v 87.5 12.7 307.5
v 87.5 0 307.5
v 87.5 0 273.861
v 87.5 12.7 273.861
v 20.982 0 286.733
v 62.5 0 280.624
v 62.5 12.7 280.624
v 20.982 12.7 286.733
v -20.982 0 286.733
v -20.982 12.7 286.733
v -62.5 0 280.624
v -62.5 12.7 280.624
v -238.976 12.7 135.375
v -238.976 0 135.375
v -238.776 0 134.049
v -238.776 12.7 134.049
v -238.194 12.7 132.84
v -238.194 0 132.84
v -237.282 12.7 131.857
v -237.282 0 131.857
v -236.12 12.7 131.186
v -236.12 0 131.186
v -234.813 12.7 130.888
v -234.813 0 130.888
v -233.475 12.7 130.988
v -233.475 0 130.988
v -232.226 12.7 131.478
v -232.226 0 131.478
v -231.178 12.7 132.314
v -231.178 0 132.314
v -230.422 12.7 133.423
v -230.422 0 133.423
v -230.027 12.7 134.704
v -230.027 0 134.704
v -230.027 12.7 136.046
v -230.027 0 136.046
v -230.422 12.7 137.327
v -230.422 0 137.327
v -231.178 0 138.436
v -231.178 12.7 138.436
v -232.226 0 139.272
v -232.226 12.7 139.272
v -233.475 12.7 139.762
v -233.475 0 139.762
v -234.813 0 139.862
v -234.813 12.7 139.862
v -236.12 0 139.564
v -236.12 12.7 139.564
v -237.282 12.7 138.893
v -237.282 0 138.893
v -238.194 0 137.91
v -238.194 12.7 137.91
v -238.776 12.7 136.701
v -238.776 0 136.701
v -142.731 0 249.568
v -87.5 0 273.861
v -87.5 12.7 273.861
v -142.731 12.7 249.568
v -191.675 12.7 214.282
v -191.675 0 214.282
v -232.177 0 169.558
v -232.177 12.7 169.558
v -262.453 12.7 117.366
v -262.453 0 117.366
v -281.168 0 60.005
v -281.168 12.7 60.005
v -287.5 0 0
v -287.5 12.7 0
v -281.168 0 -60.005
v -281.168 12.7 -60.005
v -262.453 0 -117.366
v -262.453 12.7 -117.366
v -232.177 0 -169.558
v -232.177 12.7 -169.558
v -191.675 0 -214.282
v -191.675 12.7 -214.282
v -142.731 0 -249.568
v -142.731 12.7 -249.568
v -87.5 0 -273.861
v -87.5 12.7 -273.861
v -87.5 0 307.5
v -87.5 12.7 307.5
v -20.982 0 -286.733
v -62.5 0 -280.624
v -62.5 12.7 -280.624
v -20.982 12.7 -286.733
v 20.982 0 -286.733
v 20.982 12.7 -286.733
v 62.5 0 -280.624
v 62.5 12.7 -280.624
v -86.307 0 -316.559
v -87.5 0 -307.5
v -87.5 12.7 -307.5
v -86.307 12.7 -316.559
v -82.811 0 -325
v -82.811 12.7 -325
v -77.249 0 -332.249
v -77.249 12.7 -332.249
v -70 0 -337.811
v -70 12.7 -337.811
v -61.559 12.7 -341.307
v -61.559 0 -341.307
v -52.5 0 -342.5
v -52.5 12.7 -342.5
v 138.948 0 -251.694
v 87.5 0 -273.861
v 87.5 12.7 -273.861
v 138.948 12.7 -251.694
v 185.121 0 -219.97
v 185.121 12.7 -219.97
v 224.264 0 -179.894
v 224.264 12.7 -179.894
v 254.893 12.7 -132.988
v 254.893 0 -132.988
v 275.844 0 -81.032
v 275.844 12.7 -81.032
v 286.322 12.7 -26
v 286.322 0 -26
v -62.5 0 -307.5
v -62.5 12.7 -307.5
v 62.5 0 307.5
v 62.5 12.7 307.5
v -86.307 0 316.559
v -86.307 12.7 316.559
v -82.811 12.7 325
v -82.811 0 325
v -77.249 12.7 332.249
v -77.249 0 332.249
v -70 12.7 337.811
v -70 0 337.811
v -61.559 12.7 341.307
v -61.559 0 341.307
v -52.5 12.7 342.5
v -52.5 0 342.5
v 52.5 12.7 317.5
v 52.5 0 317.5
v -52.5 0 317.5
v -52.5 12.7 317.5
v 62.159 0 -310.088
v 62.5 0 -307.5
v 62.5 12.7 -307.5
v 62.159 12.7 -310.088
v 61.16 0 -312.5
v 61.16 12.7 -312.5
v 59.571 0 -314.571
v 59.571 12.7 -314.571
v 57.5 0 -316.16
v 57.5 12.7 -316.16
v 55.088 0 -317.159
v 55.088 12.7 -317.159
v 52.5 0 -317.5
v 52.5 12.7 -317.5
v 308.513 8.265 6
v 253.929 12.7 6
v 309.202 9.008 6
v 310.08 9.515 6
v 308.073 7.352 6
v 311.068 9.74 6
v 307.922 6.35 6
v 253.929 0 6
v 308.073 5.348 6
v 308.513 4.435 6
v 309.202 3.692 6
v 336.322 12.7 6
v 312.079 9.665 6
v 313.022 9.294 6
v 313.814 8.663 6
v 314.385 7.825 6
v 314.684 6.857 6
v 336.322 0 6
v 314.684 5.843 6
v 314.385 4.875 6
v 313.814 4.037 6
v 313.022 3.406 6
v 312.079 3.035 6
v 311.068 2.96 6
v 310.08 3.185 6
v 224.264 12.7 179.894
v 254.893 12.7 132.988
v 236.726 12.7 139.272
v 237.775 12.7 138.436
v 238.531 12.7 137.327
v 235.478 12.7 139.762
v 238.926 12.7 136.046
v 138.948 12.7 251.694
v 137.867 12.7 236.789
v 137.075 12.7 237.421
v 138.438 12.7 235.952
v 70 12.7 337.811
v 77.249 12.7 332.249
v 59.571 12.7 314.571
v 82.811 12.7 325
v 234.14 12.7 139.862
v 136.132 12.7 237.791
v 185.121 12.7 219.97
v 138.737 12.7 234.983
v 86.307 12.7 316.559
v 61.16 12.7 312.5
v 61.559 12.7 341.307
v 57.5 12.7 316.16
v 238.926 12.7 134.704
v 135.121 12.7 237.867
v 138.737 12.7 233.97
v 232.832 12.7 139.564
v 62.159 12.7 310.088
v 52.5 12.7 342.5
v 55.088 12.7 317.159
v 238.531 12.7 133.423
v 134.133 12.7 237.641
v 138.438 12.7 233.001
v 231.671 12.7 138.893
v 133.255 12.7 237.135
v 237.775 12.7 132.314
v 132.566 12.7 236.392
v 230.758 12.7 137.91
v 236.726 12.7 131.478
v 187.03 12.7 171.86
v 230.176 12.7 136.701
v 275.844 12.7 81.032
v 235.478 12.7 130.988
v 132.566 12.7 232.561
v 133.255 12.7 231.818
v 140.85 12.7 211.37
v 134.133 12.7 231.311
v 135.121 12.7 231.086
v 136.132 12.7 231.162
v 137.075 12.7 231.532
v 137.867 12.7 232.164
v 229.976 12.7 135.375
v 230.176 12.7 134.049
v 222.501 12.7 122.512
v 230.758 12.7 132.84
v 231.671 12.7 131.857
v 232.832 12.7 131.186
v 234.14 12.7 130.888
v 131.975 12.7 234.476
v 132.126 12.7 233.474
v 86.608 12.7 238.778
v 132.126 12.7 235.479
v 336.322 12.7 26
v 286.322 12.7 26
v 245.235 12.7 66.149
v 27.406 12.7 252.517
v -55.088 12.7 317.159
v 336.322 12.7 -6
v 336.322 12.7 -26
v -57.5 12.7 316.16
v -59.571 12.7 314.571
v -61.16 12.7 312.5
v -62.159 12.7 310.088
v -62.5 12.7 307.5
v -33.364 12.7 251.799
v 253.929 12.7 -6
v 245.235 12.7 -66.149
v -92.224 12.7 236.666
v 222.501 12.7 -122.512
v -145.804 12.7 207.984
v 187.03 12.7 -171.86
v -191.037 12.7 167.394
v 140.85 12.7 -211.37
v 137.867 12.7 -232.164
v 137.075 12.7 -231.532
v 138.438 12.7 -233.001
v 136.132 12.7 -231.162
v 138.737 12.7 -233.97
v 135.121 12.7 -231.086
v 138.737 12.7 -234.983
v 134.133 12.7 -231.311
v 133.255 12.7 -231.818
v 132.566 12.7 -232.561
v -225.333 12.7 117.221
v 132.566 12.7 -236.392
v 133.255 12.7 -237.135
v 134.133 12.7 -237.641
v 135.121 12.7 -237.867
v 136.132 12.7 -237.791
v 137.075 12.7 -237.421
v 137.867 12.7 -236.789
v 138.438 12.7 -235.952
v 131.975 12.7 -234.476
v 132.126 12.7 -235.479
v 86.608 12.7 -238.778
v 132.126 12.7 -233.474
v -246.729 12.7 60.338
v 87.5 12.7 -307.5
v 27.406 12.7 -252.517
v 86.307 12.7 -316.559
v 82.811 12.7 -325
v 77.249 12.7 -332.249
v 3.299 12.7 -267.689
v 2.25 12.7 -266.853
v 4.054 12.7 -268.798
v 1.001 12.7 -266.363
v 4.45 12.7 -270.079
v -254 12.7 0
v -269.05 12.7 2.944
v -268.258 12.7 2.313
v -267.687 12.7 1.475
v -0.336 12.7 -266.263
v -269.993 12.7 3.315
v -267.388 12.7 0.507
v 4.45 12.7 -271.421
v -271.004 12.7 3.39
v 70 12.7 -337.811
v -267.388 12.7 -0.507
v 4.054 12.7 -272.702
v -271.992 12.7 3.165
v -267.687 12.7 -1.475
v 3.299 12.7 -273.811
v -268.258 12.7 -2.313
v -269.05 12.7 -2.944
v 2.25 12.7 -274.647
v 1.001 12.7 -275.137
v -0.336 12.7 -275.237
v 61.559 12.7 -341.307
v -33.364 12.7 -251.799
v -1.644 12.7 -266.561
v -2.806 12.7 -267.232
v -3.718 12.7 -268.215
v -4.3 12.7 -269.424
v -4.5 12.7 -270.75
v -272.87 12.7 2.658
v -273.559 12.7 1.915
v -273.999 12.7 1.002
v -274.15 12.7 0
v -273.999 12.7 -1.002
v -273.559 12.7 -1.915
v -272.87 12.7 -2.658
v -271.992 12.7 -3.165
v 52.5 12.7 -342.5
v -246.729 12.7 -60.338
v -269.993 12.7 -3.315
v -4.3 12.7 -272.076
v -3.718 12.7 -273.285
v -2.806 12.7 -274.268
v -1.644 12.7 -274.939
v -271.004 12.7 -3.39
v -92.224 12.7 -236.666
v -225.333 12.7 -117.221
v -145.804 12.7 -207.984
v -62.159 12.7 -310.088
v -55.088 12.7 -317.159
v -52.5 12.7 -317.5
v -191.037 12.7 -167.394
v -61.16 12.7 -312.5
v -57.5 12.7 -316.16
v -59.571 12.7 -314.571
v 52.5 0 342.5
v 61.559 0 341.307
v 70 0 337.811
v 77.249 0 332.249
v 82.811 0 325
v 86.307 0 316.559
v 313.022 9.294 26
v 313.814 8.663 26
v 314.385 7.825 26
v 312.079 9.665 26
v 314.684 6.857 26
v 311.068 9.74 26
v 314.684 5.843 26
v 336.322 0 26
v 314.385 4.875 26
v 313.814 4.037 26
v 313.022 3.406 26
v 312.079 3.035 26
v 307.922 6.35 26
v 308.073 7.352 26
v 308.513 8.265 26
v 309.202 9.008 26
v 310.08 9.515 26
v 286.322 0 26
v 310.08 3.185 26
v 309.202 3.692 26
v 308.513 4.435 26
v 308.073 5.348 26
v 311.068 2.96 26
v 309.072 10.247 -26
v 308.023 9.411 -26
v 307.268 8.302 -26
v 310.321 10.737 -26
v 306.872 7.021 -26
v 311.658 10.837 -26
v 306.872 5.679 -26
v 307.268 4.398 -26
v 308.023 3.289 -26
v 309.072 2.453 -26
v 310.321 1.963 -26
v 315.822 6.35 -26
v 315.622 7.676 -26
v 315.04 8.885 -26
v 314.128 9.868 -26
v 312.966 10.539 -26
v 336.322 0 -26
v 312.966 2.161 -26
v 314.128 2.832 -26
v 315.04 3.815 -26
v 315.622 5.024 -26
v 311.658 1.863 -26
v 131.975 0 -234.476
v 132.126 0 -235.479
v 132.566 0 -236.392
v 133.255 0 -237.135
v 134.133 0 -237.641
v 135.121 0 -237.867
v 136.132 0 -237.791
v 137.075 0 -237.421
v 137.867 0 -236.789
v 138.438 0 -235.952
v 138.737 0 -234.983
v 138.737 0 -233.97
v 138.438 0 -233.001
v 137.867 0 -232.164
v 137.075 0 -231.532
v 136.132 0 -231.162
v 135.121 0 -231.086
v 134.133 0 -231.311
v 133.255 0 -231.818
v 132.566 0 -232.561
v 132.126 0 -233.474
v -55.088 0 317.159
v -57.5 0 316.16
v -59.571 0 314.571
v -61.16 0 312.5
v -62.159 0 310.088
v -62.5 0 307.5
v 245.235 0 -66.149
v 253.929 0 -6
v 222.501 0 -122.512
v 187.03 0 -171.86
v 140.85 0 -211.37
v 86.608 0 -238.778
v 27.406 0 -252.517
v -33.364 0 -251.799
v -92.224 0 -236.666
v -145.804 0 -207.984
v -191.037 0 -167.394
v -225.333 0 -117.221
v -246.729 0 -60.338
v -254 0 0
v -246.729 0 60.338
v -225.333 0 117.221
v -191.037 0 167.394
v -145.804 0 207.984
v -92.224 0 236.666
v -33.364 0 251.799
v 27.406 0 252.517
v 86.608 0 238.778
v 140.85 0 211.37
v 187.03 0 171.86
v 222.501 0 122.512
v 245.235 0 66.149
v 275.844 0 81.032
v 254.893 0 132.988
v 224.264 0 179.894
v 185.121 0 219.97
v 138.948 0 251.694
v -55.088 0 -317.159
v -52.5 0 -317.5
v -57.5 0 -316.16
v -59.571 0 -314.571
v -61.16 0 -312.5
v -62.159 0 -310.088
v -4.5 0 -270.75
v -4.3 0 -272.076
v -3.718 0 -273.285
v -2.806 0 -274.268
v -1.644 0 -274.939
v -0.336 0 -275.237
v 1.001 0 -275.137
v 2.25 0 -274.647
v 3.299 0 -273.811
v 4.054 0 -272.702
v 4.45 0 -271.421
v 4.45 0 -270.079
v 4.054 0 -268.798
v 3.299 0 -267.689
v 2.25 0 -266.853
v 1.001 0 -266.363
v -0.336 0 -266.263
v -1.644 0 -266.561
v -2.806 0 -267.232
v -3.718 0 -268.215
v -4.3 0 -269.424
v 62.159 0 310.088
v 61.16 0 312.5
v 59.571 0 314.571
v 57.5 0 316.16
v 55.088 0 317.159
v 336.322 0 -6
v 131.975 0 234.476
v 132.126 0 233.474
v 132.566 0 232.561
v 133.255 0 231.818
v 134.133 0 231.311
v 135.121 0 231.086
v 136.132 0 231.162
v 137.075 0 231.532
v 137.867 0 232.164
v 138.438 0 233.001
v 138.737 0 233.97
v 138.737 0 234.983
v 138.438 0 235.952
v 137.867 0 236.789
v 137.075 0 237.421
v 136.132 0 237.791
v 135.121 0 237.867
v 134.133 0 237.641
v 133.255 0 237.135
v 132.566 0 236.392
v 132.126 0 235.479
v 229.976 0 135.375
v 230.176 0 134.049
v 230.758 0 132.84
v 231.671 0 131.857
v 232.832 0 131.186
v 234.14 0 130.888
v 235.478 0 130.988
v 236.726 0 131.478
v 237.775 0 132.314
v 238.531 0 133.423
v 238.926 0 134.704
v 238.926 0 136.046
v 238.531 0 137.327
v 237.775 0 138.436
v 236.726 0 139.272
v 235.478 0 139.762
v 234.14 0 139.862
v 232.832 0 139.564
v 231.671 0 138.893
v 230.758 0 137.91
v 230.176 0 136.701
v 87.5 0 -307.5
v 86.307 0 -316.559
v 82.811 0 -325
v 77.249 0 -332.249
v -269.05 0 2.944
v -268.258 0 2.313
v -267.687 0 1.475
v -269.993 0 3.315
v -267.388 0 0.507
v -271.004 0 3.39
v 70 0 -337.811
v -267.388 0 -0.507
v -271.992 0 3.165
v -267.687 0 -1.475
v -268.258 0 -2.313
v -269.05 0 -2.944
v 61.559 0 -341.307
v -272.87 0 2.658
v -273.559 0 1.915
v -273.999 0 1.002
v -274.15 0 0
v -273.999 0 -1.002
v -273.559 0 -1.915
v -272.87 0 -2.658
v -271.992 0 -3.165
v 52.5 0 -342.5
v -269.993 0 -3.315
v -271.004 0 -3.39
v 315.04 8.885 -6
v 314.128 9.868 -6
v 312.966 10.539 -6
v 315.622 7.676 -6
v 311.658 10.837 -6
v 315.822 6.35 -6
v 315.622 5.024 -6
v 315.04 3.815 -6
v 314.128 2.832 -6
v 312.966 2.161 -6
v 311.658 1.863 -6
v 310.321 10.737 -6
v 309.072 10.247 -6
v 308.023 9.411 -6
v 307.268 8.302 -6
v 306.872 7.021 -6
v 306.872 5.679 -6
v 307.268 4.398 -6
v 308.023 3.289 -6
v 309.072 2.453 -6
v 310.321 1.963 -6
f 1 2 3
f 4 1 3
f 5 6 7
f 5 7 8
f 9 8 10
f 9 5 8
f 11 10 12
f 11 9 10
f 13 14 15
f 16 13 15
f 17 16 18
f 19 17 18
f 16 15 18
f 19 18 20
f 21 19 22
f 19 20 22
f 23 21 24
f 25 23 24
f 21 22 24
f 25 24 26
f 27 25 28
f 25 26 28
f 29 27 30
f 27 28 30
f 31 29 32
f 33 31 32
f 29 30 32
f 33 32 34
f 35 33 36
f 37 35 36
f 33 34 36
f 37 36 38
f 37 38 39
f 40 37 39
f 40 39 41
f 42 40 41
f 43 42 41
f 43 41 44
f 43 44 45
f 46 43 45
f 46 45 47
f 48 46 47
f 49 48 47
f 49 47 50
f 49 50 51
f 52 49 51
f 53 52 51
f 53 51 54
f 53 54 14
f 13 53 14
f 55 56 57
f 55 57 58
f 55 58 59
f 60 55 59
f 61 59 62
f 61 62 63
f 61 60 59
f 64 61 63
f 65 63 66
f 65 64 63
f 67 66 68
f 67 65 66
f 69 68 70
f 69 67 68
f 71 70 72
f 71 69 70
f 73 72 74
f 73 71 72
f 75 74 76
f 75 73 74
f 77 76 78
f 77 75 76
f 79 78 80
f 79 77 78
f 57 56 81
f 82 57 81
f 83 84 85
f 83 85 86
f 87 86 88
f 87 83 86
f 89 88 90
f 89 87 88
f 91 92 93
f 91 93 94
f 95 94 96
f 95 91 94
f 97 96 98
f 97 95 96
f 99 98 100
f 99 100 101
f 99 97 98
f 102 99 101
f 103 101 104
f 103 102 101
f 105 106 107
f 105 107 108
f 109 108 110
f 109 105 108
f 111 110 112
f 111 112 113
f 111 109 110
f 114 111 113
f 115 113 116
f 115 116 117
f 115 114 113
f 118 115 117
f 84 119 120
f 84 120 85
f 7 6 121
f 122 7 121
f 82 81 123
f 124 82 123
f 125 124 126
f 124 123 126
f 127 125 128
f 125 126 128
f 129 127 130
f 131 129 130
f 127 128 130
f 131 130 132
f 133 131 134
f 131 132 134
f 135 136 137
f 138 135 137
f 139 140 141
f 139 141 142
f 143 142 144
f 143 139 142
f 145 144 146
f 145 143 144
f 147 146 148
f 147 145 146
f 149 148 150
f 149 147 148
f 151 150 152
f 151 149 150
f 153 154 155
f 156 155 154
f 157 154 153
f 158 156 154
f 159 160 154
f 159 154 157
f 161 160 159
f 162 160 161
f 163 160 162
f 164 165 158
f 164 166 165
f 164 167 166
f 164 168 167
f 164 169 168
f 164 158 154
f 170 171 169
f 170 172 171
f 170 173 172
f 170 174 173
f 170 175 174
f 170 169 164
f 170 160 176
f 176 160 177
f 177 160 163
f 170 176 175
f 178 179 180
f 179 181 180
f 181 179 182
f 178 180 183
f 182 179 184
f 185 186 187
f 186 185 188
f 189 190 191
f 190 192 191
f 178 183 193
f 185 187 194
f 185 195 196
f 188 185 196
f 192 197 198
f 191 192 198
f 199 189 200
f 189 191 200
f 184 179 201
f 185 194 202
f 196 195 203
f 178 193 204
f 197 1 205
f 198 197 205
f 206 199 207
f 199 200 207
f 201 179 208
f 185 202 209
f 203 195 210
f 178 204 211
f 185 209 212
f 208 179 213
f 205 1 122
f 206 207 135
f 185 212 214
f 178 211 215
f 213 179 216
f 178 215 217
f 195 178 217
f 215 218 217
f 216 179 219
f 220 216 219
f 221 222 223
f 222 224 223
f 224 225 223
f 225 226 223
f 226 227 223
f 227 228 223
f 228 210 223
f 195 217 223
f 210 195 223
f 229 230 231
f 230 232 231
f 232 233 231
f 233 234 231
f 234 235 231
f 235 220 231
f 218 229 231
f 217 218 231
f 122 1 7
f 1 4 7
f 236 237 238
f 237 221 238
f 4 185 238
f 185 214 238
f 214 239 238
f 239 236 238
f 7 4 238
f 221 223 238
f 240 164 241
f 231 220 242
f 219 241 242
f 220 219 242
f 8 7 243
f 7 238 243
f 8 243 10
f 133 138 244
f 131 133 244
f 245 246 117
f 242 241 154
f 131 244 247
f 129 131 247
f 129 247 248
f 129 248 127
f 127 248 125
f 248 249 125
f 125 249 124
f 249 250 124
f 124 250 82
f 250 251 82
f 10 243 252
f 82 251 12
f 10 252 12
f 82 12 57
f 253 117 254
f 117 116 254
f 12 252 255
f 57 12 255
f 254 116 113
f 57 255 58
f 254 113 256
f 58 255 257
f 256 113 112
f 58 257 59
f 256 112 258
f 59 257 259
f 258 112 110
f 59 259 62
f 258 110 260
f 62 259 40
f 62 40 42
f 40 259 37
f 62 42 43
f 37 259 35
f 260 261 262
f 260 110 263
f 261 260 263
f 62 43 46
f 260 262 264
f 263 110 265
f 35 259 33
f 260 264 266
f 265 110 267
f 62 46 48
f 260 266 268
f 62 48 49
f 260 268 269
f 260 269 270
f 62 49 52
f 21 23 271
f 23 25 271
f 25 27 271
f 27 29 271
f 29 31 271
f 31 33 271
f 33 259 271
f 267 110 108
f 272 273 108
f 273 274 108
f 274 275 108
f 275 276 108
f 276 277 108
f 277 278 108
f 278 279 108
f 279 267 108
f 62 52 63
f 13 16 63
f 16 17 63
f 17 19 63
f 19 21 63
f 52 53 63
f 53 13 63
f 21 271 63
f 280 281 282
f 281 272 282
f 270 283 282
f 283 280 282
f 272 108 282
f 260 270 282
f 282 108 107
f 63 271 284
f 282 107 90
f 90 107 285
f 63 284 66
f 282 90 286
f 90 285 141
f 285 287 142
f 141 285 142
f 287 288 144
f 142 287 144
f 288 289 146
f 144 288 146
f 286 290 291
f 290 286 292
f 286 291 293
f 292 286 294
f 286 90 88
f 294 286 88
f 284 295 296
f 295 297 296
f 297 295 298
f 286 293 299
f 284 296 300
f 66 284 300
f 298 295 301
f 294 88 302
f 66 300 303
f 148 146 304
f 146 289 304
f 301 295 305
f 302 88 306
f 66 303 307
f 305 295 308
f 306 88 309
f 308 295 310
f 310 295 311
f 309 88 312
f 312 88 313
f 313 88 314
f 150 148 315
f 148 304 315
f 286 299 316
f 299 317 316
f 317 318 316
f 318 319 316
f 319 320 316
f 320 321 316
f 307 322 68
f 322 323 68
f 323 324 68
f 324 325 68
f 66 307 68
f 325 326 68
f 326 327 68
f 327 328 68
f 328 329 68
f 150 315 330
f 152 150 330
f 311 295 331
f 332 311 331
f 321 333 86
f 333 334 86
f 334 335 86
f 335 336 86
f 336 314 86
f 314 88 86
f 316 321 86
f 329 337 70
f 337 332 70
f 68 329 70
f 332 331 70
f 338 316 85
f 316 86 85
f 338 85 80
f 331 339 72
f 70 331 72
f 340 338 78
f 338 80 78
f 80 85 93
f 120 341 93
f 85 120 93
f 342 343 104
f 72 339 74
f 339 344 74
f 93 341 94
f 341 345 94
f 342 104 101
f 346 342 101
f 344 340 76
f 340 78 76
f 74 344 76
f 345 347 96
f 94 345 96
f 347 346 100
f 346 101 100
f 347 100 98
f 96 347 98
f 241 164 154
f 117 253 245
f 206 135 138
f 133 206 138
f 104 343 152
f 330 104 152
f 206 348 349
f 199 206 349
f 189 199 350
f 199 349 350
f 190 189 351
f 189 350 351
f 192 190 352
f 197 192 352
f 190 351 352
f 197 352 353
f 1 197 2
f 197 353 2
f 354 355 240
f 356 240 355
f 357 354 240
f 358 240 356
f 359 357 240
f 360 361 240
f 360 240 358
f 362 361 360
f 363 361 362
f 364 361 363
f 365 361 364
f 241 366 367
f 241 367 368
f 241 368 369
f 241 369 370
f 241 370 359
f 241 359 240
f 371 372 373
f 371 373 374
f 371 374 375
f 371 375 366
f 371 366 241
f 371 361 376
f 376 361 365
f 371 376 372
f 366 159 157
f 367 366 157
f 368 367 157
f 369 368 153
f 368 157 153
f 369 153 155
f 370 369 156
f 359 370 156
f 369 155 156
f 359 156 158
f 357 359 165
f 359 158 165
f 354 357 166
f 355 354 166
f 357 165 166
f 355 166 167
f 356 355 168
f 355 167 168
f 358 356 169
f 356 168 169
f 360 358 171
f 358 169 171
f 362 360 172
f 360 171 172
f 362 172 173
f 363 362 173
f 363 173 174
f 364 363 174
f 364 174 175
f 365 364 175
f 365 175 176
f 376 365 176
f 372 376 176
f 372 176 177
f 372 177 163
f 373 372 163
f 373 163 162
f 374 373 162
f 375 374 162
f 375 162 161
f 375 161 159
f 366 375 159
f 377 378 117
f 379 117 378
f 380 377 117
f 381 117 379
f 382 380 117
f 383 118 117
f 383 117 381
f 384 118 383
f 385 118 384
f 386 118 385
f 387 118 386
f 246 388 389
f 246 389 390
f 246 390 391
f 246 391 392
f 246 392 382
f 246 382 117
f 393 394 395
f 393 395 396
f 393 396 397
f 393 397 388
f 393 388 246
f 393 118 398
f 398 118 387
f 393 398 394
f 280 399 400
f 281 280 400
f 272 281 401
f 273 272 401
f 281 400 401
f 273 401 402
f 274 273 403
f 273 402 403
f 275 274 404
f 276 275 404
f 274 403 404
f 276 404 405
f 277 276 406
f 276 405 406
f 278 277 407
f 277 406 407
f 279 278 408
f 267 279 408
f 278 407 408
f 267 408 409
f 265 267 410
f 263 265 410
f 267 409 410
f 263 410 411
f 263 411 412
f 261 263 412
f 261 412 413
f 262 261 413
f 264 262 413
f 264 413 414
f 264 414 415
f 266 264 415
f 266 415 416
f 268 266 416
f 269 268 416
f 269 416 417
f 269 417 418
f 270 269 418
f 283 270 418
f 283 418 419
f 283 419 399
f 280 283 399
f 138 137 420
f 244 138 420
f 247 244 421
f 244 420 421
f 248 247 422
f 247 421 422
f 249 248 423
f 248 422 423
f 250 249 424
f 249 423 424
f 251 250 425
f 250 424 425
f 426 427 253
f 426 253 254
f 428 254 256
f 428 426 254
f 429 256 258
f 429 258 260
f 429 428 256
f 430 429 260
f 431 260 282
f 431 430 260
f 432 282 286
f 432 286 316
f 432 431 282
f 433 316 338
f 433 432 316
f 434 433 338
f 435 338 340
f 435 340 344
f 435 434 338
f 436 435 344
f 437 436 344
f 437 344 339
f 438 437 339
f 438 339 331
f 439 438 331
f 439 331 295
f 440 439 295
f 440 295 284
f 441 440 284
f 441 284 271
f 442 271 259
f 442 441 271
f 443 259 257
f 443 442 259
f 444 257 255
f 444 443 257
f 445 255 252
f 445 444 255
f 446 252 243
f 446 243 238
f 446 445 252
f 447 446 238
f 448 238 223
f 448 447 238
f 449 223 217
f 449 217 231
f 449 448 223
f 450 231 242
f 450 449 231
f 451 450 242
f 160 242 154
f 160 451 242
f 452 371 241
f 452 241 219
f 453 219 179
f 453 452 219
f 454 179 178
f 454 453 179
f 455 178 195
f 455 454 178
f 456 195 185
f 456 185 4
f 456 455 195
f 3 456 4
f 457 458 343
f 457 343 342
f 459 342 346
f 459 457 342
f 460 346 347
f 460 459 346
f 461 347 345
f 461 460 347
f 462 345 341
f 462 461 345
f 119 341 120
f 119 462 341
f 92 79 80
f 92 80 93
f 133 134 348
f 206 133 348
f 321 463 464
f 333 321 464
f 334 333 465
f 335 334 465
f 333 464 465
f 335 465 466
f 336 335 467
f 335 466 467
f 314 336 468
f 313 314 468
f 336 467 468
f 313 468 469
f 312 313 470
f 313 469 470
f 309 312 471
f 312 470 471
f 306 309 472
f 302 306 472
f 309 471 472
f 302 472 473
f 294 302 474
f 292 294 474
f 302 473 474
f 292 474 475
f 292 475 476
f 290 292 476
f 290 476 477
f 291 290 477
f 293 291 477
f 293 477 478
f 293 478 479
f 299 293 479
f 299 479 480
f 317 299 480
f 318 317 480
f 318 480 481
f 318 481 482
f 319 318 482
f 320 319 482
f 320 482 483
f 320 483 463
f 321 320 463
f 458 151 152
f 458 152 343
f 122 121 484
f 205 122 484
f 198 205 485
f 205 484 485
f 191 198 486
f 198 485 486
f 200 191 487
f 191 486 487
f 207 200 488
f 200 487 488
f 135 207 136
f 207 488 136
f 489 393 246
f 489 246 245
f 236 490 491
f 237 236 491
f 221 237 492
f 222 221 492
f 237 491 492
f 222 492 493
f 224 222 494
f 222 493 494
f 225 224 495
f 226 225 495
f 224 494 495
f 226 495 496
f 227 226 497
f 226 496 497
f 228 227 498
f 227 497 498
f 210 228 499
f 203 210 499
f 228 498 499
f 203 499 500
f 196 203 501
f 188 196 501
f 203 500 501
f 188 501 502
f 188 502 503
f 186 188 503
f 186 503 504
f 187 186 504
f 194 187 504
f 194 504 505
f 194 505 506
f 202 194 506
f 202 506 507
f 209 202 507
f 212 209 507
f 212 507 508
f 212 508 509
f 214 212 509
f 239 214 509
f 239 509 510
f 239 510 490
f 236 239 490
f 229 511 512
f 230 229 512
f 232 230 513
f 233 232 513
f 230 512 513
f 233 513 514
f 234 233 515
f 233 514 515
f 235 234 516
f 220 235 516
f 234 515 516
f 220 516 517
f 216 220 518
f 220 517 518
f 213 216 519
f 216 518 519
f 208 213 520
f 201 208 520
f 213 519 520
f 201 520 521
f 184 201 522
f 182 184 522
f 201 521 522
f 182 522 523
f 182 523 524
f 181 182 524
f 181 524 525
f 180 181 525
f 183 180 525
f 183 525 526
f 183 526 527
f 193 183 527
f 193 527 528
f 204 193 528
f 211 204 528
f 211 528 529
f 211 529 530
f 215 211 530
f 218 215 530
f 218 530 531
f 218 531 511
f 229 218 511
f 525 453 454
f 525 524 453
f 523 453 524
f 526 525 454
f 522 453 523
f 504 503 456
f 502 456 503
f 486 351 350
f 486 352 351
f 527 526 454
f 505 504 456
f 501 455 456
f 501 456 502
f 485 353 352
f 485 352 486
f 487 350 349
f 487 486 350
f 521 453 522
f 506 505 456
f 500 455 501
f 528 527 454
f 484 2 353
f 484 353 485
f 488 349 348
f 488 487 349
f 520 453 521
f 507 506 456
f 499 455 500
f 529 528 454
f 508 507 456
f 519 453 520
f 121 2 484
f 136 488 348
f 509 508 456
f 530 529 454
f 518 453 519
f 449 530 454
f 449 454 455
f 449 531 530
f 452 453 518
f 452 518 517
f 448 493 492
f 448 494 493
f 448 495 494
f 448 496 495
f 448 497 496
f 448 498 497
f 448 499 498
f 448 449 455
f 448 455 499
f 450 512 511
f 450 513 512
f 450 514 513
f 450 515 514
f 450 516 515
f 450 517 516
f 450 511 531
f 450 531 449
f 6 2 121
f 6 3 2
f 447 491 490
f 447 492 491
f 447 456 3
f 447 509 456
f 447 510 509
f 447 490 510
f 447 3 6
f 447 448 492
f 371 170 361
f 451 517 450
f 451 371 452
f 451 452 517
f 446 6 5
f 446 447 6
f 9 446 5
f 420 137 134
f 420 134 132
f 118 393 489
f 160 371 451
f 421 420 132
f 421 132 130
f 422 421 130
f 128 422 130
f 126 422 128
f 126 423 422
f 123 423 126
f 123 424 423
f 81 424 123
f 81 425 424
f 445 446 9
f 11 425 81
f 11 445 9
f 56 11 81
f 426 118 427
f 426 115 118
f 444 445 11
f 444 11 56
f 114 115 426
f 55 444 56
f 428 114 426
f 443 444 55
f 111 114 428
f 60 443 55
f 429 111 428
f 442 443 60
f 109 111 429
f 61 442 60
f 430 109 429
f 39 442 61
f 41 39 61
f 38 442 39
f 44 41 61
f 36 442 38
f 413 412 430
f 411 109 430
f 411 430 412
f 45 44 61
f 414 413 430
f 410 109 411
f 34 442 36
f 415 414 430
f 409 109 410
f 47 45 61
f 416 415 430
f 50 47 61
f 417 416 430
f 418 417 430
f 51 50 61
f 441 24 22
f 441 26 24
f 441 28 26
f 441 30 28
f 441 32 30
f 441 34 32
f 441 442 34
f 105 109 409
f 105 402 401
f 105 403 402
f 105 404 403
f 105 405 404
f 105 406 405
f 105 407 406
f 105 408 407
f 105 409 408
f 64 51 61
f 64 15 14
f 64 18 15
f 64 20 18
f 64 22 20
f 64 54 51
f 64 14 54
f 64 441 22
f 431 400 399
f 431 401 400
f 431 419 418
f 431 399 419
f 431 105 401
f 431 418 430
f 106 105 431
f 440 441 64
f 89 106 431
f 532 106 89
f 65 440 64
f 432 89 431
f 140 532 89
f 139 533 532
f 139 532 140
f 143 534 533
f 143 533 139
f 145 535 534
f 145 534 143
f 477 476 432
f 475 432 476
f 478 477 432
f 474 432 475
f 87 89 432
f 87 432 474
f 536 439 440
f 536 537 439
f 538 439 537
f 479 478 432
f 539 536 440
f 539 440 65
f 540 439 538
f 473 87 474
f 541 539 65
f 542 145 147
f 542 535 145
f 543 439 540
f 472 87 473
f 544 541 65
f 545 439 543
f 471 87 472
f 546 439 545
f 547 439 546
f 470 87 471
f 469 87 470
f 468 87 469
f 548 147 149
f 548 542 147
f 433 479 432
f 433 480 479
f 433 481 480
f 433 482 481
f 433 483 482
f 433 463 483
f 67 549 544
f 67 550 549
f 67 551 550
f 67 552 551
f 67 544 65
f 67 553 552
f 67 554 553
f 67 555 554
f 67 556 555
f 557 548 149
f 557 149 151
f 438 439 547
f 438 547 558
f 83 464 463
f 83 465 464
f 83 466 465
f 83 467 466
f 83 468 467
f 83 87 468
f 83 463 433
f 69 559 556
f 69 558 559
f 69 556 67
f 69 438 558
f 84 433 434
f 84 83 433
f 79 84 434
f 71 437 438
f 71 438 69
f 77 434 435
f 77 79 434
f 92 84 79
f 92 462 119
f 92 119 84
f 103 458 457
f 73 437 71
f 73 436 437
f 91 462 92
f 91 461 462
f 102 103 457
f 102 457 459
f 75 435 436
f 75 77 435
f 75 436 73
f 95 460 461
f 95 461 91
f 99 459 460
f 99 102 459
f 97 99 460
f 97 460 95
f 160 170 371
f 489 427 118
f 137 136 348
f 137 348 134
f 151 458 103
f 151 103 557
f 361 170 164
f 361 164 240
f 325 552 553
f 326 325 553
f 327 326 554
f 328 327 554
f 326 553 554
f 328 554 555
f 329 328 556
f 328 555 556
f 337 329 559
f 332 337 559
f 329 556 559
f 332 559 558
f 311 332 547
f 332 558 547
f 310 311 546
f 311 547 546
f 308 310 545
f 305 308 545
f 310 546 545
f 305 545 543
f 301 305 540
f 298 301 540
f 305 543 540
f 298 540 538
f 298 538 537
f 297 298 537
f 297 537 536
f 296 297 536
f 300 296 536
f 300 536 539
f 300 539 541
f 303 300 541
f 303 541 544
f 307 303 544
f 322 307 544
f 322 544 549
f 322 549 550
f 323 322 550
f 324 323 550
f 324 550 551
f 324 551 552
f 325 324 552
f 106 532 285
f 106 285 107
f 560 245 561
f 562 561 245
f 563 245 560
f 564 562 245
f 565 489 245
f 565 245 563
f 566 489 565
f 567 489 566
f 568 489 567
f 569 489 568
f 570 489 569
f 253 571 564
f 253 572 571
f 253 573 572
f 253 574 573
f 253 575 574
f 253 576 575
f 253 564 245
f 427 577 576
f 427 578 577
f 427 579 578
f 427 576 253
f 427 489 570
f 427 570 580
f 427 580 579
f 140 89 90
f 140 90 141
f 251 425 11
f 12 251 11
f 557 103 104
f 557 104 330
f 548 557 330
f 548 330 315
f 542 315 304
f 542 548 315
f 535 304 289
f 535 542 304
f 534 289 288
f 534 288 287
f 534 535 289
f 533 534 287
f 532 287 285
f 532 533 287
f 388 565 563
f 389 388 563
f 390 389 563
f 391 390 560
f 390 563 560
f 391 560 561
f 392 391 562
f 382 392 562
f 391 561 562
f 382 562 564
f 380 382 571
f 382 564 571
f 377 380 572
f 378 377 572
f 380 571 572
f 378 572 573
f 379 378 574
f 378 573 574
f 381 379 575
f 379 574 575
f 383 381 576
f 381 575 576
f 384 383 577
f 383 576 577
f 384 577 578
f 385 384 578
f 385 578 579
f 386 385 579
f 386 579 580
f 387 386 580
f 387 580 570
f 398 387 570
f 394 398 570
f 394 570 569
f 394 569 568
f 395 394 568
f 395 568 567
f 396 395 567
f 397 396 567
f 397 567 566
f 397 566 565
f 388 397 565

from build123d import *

# Parameters (mm, degrees)
BOSS_EXTRUDE1_DEPTH                          = 12.7
M8X1_25_TAPPED_HOLE1_FOR_LOWERING_D          = 6.8
M8_CLEARANCE_HOLE1_FOR_SPACER_BLOCK_D        = 9
M8_CLEARANCE_HOLE2_FOR_CLAMP_TIGHTENIN_D     = 9
M8_CLEARANCE_HOLE2_FOR_CLAMP_TIGHTENIN_DEPTH = 20
M8X1_25_TAPPED_HOLE2_FOR_CLAMP_TIGHTEN_D     = 6.8
BOSS_EXTRUDE2_START                          = -12.7
BOSS_EXTRUDE2_HANDLES_DEPTH                  = 12.7


with BuildPart() as part:
    # Sketch1 → Boss-Extrude1 (new body)
    with BuildSketch(Plane(origin=(0, 0, 0), x_dir=(1, 0, 0), z_dir=(0, 1, 0))):
        with BuildLine():
            Line((275.144331903, 6), (253.92912397, 6))
            ThreePointArc((253.92912397, 6), (-254, 0), (253.92912397, -6))
            Line((253.92912397, -6), (275.067203981, -6))
            Line((275.067203981, -6), (336.321934193, -6))
            Line((336.321934193, -6), (336.321934193, -26))
            Line((336.321934193, -26), (286.321934193, -26))
            ThreePointArc((286.321934193, -26), (-287.5, 0), (286.321934193, 26))
            Line((286.321934193, 26), (336.321934193, 26))
            Line((336.321934193, 26), (336.321934193, 6))
            Line((336.321934193, 6), (275.144331903, 6))
        make_face()
    extrude(amount=BOSS_EXTRUDE1_DEPTH)

    # M8x1.25 Tapped Hole1 - For Lowering (through all)
    with Locations(Plane(origin=(0, 12.7, 0), x_dir=(1, 0, 0), z_dir=(0, 1, 0))):
        with Locations((135.375, -234.476378075), (-270.75, 0), (135.375, 234.476378075)):
            Hole(M8X1_25_TAPPED_HOLE1_FOR_LOWERING_D / 2)

    # M8 Clearance Hole1 - For Spacer Block (through all)
    with Locations(Plane(origin=(0, 12.7, 0), x_dir=(1, 0, 0), z_dir=(0, 1, 0))):
        with Locations((0, 270.75), (234.476378075, -135.375), (-234.476378075, -135.375)):
            Hole(M8_CLEARANCE_HOLE1_FOR_SPACER_BLOCK_D / 2)

    # M8 Clearance Hole2 - For Clamp Tightening
    with Locations(Plane(origin=(0, 0, -26), x_dir=(-1, 0, 0), z_dir=(0, 0, -1))):
        with Locations((-311.321934193, 6.35)):
            Hole(M8_CLEARANCE_HOLE2_FOR_CLAMP_TIGHTENIN_D / 2, depth=M8_CLEARANCE_HOLE2_FOR_CLAMP_TIGHTENIN_DEPTH)

    # M8x1.25 Tapped Hole2 - For Clamp Tightening (through all)
    with Locations(Plane.XY.offset(26)):
        with Locations((311.321934193, 6.35)):
            Hole(M8X1_25_TAPPED_HOLE2_FOR_CLAMP_TIGHTEN_D / 2)

    # Sketch14 → Boss-Extrude2 - Handles (add)
    with BuildSketch(Plane(origin=(0, 12.7, 0), x_dir=(1, 0, 0), z_dir=(0, 1, 0)).offset(BOSS_EXTRUDE2_START)):
        with BuildLine():
            Line((-52.5, 342.5), (52.5, 342.5))
            ThreePointArc((52.5, 342.5), (77.248737342, 332.248737342), (87.5, 307.5))
            Line((87.5, 307.5), (87.5, 273.861278753))
            ThreePointArc((87.5, 273.861278753), (75.076192149, 277.524441036), (62.5, 280.624304008))
            Line((62.5, 280.624304008), (62.5, 307.5))
            ThreePointArc((62.5, 307.5), (59.571067812, 314.571067812), (52.5, 317.5))
            Line((52.5, 317.5), (-52.5, 317.5))
            ThreePointArc((-52.5, 317.5), (-59.571067812, 314.571067812), (-62.5, 307.5))
            Line((-62.5, 307.5), (-62.5, 280.624304008))
            ThreePointArc((-62.5, 280.624304008), (-75.076192149, 277.524441036), (-87.5, 273.861278753))
            Line((-87.5, 273.861278753), (-87.5, 307.5))
            ThreePointArc((-87.5, 307.5), (-77.248737342, 332.248737342), (-52.5, 342.5))
        make_face()
    boss_extrude2_handles = extrude(amount=BOSS_EXTRUDE2_HANDLES_DEPTH)

    # Mirror1: Boss-Extrude2 - Handles across plane
    add(boss_extrude2_handles.mirror(Plane.XY))


solid = part.part
